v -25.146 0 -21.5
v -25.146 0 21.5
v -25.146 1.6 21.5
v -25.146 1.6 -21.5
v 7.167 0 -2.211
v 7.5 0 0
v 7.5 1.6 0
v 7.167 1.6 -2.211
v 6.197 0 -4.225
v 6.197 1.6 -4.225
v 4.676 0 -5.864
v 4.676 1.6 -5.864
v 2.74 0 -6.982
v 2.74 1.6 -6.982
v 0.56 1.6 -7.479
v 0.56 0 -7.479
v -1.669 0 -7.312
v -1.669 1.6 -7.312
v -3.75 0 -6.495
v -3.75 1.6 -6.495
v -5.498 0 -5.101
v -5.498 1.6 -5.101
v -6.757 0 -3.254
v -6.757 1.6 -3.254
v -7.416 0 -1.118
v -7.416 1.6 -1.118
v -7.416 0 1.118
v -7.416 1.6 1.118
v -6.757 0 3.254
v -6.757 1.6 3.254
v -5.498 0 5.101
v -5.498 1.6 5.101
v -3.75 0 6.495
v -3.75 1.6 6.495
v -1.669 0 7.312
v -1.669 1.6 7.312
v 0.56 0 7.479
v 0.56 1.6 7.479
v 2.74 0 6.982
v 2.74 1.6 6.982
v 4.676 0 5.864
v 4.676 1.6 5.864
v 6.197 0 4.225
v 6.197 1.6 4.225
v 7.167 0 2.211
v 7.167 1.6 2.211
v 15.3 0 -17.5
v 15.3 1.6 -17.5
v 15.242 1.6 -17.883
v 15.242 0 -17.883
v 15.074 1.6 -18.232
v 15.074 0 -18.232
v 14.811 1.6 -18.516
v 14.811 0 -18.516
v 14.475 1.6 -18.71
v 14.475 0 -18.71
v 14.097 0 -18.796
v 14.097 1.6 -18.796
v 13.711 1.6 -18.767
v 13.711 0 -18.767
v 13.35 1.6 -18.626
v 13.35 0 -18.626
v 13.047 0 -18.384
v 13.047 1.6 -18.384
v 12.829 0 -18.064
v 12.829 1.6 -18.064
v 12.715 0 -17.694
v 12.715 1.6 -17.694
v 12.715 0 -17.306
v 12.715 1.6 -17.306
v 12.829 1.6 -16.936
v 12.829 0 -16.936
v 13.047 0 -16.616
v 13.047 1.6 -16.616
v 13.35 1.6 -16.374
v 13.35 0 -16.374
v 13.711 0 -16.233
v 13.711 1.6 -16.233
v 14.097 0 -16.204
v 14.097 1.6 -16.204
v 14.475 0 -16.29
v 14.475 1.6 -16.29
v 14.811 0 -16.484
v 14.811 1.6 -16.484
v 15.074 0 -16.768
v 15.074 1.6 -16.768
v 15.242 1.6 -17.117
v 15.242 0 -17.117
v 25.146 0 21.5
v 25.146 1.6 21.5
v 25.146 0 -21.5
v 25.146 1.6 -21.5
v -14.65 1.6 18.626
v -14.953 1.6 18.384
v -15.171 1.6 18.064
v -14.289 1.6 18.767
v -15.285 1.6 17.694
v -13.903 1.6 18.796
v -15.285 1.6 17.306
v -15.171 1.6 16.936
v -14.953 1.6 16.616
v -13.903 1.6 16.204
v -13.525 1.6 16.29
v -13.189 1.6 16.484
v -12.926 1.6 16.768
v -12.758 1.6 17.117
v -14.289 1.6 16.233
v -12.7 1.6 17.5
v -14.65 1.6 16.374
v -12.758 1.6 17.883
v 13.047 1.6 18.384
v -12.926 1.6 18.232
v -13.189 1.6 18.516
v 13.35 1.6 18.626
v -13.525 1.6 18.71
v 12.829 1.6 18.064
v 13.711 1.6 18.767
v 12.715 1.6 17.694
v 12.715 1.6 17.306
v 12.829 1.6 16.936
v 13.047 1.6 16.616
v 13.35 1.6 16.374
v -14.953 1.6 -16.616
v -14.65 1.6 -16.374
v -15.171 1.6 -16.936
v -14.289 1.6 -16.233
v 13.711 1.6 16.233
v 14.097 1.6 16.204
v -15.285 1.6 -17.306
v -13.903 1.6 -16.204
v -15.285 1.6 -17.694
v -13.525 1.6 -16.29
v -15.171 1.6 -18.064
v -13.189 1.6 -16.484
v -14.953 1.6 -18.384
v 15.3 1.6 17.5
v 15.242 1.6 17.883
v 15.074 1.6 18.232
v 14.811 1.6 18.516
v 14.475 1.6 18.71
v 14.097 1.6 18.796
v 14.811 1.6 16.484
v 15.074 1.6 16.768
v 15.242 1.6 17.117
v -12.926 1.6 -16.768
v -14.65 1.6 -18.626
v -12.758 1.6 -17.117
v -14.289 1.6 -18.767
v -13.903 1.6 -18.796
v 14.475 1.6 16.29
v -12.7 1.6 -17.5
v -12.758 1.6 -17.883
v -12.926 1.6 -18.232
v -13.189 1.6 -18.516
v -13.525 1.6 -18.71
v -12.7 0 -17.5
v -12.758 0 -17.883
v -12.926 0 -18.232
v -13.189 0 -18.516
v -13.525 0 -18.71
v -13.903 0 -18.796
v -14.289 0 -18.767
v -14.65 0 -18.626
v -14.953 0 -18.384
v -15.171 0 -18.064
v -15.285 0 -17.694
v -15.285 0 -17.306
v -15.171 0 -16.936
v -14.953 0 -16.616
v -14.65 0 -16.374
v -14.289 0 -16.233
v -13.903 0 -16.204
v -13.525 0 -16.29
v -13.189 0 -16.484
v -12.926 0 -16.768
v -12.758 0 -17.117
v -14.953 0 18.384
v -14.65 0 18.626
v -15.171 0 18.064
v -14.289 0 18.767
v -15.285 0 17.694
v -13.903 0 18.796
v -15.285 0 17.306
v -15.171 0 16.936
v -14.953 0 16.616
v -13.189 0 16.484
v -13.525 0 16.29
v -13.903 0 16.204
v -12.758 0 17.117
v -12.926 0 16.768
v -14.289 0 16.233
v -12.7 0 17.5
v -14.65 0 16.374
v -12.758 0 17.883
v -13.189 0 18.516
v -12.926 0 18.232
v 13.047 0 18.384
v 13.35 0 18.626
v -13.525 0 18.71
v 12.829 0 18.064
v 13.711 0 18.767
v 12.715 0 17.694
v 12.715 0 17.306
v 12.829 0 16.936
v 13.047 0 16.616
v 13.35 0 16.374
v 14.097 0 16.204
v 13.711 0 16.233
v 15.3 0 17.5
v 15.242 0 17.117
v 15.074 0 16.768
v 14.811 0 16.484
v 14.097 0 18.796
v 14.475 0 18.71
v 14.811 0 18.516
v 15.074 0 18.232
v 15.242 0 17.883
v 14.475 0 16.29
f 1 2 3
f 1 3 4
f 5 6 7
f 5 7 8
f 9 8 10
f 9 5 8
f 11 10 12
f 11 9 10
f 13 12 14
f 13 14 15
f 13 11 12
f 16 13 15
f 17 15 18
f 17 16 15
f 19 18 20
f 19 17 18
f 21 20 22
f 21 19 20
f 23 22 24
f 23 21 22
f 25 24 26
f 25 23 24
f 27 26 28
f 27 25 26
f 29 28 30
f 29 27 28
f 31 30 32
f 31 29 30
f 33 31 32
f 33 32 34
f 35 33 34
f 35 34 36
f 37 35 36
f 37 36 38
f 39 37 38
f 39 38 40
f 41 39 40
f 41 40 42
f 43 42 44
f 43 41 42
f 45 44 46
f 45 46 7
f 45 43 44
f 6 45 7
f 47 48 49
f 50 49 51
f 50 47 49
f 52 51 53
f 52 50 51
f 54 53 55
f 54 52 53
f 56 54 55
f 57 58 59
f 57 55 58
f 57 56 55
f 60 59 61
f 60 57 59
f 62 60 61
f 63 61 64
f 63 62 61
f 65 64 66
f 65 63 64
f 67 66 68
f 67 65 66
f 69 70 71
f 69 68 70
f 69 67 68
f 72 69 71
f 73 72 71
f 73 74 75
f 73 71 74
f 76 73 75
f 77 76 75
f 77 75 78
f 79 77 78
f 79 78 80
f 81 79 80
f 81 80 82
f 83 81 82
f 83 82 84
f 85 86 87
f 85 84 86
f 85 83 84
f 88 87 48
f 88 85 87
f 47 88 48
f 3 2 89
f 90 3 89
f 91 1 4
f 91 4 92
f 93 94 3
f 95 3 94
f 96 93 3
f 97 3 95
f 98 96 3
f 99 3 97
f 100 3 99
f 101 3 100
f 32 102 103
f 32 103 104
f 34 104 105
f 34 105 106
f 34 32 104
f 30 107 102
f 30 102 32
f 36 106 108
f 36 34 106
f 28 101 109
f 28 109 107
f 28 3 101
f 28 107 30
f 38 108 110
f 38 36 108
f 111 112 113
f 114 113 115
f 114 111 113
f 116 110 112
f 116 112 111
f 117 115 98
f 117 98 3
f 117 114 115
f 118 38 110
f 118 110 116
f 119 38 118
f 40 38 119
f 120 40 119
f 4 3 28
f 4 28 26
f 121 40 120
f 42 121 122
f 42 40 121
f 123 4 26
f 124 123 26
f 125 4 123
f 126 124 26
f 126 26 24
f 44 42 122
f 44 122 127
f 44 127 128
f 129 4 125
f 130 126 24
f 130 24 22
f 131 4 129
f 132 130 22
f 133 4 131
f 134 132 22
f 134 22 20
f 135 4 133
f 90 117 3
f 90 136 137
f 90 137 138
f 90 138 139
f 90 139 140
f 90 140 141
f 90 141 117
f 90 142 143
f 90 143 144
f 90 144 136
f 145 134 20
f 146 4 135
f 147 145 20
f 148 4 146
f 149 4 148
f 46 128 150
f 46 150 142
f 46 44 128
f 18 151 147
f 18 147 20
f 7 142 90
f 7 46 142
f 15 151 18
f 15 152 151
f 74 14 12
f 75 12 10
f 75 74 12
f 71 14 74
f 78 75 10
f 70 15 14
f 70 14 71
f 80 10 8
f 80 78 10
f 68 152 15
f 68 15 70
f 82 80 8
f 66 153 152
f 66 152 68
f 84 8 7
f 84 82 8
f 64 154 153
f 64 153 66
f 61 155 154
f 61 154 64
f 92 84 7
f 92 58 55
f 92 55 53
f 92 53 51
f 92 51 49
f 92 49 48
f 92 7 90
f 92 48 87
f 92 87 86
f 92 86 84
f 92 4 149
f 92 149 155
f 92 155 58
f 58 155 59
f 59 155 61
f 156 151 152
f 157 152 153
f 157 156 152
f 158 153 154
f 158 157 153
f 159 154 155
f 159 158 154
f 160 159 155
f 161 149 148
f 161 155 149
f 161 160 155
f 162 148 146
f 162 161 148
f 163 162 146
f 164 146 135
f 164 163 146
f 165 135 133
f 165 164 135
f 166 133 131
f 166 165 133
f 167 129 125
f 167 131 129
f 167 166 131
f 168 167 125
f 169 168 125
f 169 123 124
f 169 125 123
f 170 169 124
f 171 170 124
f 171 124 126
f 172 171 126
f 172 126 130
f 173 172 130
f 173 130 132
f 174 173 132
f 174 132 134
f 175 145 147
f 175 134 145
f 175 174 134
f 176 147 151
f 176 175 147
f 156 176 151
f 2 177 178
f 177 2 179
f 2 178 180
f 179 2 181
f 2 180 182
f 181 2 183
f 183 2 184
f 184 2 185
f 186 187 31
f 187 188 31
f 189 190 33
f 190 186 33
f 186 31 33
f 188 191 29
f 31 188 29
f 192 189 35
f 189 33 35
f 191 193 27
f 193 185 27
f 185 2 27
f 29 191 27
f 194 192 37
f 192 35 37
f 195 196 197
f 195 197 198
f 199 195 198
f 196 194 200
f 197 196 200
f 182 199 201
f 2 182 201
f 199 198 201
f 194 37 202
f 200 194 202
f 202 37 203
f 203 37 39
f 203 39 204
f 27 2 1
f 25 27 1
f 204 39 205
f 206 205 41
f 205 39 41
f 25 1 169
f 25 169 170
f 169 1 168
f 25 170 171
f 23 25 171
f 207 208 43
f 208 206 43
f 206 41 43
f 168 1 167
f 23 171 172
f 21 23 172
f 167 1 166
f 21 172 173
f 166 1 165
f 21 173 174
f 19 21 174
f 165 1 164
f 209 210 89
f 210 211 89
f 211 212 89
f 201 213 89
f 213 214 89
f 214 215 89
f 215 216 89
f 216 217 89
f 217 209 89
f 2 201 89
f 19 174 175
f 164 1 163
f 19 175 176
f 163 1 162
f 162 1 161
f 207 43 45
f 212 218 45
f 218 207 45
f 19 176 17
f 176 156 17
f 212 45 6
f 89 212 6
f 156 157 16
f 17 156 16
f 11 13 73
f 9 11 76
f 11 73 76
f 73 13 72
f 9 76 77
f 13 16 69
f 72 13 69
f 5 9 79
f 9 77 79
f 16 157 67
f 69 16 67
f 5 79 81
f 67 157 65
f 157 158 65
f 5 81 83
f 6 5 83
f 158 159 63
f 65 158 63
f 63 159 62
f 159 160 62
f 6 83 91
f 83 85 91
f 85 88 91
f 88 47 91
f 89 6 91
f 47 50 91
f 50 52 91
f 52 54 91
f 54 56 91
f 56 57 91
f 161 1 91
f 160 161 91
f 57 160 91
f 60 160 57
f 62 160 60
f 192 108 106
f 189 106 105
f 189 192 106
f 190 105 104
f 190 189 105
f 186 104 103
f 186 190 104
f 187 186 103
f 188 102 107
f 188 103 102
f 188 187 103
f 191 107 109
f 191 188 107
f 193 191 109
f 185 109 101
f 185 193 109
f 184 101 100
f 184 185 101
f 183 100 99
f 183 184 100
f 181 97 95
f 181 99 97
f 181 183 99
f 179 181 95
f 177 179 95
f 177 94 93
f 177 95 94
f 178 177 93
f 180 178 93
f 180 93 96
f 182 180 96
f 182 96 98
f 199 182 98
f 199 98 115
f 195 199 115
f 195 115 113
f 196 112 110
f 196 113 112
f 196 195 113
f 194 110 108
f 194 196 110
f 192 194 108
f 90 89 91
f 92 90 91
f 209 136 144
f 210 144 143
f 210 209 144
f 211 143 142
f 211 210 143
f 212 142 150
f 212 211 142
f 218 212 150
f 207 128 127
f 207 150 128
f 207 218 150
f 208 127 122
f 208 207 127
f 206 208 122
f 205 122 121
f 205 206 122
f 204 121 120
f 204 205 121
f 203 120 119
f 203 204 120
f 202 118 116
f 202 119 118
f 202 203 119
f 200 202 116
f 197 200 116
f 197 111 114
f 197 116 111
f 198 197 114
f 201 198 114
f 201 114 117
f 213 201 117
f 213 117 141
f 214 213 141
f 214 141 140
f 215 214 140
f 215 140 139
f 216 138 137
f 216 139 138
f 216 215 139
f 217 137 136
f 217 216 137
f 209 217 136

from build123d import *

# Parameters (mm, degrees)
SKETCH1_W           = 50.292
SKETCH1_H           = 43
SKETCH1_R           = 7.5
BOSS_EXTRUDE1_DEPTH = 1.6
SKETCH2_R           = 1.3
CUT_EXTRUDE3_DEPTH  = 2.6


with BuildPart() as part:
    # Sketch1 → Boss-Extrude1 (new body)
    with BuildSketch(Plane(origin=(0, 0, 0), x_dir=(1, 0, 0), z_dir=(0, 1, 0))):
        Rectangle(SKETCH1_W, SKETCH1_H)
        Circle(SKETCH1_R, mode=Mode.SUBTRACT)
    extrude(amount=BOSS_EXTRUDE1_DEPTH)

    # Sketch2 → Cut-Extrude3 (cut, through all)
    with BuildSketch(Plane(origin=(0, 0, 0), x_dir=(1, 0, 0), z_dir=(0, 1, 0))):
        with Locations((-14, 17.5)):
            Circle(SKETCH2_R)
        with Locations((14, 17.5)):
            Circle(SKETCH2_R)
        with Locations((14, -17.5)):
            Circle(SKETCH2_R)
        with Locations((-14, -17.5)):
            Circle(SKETCH2_R)
    extrude(amount=CUT_EXTRUDE3_DEPTH, mode=Mode.SUBTRACT)


solid = part.part
